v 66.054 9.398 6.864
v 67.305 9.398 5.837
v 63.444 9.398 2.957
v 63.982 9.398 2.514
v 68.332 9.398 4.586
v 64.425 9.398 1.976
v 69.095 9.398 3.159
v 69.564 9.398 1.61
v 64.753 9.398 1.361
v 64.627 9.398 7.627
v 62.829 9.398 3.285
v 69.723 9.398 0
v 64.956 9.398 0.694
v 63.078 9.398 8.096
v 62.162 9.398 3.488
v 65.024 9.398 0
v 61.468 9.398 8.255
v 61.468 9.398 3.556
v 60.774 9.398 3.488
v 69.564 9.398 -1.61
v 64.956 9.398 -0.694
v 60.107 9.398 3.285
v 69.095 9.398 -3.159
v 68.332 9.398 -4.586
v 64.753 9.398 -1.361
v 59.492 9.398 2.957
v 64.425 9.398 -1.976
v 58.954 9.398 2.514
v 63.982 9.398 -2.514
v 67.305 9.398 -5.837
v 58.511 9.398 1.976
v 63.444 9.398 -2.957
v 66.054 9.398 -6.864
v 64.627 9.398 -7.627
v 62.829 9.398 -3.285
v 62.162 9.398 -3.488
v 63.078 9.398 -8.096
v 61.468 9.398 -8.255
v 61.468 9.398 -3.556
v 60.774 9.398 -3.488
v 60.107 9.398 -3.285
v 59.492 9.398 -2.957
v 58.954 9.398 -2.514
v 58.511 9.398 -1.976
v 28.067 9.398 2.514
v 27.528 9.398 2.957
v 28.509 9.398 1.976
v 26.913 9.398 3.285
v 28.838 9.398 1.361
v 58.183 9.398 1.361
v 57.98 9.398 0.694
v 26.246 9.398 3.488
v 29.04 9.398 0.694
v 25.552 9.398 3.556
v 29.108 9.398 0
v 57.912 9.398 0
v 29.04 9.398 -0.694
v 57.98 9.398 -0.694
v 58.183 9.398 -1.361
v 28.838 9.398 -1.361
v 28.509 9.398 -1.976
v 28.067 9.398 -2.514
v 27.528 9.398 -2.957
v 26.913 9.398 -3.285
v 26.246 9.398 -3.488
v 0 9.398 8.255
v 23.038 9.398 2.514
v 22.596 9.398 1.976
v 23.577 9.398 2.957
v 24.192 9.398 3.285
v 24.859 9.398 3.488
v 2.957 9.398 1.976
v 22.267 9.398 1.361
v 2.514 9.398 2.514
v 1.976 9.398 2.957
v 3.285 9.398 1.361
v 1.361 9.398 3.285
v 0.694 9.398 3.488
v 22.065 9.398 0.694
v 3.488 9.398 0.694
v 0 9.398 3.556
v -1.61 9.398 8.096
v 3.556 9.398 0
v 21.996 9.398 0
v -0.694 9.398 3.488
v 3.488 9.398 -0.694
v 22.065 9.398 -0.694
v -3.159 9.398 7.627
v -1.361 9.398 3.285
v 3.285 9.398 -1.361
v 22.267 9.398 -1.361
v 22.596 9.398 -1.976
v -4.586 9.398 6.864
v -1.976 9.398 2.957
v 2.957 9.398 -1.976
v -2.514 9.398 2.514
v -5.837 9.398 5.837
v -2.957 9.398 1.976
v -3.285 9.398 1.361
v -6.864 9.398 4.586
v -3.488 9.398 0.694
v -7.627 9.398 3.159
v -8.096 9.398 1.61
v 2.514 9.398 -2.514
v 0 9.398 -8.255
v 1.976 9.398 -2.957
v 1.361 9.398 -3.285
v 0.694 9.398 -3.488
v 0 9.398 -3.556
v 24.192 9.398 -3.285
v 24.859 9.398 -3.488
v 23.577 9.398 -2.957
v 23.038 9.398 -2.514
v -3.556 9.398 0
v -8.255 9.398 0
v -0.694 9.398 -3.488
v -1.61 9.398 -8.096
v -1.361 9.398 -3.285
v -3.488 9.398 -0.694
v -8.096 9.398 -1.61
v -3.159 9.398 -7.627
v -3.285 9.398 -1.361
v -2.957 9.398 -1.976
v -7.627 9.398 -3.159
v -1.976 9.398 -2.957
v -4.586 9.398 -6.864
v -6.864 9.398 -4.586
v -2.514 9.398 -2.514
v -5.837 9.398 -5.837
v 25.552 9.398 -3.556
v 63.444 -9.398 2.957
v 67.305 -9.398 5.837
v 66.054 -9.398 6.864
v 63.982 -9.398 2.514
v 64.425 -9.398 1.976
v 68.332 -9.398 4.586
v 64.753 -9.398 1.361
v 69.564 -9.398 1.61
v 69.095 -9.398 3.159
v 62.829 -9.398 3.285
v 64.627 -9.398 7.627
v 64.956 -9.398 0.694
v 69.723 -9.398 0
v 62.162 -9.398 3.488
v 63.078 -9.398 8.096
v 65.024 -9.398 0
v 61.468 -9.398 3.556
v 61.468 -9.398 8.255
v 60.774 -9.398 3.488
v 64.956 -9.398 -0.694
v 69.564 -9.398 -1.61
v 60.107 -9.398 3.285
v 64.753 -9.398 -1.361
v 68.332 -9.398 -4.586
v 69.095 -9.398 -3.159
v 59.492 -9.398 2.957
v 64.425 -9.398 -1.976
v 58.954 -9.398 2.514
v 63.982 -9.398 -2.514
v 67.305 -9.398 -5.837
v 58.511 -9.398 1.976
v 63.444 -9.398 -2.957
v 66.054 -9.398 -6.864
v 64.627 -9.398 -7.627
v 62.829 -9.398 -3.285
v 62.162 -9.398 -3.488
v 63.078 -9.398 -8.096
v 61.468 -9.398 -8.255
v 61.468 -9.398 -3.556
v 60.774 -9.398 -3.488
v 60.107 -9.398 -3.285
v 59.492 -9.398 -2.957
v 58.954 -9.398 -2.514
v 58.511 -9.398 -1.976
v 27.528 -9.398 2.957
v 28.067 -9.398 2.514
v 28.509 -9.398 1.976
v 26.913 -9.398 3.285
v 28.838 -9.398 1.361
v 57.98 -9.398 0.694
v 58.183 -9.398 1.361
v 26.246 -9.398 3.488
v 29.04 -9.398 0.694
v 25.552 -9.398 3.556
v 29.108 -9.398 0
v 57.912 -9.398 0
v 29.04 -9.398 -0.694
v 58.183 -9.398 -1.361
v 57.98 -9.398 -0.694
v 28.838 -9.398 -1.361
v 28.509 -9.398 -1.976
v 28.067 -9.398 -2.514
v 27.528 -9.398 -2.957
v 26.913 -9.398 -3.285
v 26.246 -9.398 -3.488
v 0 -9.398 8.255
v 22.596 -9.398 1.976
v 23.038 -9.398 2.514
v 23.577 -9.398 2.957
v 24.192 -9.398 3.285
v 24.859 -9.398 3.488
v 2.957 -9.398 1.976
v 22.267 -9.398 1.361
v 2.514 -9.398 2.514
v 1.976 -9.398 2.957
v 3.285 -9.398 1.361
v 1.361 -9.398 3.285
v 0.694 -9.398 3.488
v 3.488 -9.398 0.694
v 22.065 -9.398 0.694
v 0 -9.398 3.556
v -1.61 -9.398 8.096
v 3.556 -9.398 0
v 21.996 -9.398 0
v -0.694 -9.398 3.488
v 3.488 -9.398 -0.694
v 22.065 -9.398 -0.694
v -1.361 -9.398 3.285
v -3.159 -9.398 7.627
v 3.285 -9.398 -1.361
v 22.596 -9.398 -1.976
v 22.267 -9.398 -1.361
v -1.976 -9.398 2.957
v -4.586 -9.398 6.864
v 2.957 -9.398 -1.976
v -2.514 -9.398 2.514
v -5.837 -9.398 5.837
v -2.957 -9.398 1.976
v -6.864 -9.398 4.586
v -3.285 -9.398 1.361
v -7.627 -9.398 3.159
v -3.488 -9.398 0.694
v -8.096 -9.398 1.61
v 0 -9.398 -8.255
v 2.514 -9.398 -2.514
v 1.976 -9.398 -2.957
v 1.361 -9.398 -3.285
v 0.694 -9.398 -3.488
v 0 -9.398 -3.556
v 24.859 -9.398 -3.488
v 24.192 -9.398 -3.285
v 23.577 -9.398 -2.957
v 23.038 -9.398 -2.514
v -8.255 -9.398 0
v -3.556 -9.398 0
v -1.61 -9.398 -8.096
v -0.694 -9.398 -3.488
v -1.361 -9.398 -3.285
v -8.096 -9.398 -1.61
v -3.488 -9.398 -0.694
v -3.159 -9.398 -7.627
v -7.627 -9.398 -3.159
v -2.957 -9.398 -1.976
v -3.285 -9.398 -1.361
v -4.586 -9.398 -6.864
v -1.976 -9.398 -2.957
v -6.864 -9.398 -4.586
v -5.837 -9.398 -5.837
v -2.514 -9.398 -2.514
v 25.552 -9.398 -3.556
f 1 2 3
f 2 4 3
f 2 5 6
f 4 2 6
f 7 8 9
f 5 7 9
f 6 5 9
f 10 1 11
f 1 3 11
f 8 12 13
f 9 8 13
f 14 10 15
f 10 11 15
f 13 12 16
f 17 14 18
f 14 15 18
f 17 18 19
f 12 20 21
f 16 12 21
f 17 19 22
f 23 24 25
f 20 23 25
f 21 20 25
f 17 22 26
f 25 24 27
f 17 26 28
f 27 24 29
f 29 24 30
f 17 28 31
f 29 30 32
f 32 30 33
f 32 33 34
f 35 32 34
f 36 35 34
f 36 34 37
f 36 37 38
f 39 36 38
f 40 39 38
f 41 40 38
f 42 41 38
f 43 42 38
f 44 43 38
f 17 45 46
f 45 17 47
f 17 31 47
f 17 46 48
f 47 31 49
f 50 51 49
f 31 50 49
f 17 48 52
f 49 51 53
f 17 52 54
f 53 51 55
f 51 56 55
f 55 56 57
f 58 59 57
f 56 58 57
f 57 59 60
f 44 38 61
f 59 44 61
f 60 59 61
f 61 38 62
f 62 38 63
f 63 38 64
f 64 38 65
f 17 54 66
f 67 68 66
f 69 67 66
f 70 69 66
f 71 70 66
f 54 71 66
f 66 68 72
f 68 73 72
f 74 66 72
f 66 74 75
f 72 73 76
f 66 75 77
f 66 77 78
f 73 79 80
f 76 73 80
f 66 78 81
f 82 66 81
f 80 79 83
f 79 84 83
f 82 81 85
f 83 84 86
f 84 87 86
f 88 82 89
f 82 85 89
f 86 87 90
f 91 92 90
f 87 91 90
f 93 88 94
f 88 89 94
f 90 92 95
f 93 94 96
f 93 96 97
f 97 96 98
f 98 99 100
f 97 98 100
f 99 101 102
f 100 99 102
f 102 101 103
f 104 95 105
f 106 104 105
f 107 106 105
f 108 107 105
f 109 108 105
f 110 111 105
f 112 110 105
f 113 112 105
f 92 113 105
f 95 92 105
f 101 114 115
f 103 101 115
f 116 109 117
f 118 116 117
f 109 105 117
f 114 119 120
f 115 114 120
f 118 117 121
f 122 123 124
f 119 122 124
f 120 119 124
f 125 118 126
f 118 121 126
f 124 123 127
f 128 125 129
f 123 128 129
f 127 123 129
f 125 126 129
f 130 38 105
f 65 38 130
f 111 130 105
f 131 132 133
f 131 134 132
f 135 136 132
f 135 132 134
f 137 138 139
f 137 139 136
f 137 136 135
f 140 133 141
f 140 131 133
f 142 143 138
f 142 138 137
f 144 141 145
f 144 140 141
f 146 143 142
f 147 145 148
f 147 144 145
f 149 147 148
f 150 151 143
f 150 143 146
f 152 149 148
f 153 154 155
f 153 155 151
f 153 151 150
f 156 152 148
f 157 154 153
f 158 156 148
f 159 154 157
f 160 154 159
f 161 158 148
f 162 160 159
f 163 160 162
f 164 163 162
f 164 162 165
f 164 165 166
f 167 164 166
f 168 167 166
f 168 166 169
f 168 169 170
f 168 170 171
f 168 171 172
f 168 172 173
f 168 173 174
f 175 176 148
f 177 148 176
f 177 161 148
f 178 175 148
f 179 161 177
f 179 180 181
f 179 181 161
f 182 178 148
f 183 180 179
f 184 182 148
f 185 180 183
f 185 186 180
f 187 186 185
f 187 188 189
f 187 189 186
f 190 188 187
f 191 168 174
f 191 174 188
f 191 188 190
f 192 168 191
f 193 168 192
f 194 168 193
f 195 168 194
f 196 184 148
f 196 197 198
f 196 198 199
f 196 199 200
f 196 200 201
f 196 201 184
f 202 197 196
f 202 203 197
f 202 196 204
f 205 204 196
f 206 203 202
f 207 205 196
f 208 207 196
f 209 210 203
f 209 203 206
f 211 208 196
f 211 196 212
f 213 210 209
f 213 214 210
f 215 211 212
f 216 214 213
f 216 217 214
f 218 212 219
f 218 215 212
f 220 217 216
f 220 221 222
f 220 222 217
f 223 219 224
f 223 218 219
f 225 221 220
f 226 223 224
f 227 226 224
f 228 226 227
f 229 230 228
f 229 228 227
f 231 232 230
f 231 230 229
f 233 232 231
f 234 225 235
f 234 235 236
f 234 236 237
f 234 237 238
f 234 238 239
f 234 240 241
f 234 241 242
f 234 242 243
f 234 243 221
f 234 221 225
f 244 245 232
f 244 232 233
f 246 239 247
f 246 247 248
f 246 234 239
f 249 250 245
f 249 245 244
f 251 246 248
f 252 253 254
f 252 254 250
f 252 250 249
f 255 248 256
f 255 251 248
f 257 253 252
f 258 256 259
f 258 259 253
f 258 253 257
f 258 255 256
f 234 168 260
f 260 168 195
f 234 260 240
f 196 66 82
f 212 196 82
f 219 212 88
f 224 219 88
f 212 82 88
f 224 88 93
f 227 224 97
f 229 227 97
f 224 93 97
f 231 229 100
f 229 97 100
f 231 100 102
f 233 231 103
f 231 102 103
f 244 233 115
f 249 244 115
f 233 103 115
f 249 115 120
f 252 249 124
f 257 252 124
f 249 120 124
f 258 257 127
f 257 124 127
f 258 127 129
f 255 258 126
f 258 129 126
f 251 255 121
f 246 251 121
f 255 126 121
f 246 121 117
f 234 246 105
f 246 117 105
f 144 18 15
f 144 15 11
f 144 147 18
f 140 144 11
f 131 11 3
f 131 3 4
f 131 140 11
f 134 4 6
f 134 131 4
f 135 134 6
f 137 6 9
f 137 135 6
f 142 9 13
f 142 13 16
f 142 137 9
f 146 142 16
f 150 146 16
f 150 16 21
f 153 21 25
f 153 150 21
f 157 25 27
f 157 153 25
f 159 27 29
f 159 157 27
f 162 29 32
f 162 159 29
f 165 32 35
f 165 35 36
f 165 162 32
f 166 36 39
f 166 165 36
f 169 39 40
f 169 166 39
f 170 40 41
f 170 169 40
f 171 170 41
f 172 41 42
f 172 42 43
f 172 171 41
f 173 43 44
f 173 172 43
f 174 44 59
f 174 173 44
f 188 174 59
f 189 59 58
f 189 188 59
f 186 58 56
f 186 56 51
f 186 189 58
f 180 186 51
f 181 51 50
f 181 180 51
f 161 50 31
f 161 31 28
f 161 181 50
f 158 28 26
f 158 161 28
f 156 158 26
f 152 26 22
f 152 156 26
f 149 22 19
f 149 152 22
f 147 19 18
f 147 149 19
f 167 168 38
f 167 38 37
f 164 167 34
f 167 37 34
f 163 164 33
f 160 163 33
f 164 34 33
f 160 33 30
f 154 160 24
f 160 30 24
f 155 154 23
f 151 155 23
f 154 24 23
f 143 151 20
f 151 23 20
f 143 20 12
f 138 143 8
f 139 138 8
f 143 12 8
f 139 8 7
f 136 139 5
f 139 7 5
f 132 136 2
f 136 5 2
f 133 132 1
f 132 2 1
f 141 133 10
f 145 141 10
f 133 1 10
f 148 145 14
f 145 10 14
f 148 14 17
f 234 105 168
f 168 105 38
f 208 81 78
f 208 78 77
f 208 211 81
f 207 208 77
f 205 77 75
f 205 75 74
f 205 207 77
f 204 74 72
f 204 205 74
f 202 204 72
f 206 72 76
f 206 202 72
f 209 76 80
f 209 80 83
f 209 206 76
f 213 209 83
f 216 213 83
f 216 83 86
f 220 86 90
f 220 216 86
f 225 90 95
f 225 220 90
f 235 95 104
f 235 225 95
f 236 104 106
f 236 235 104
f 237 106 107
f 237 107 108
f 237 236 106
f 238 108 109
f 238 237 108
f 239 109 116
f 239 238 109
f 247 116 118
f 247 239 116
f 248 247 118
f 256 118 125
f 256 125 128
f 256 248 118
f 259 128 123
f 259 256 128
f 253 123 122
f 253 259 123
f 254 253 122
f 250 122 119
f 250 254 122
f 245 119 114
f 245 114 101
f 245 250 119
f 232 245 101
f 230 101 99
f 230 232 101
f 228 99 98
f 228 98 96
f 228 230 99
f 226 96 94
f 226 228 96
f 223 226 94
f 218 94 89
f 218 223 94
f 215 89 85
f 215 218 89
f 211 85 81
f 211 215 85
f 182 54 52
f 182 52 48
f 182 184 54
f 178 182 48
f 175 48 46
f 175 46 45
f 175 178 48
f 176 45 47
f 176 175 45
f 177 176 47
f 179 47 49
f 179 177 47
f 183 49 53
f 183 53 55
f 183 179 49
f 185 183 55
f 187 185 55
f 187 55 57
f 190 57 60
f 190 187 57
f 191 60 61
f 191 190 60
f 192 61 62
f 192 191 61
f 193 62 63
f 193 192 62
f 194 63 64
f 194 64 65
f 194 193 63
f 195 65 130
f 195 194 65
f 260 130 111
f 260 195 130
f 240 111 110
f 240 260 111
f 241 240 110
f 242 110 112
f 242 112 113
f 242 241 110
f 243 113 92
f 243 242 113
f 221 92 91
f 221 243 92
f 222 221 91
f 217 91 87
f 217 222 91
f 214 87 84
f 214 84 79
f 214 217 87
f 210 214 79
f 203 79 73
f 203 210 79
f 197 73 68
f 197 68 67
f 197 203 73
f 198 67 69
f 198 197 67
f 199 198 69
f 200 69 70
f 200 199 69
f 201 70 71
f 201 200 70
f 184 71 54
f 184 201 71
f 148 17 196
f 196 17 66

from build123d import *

# Parameters (mm, degrees)
SKETCH1_R           = 3.556
BOSS_EXTRUDE1_DEPTH = 9.398


with BuildPart() as part:
    # Sketch1 → Boss-Extrude1 (new, symmetric)
    with BuildSketch(Plane(origin=(0, 0, 0), x_dir=(1, 0, 0), z_dir=(0, 1, 0))):
        with BuildLine():
            Line((0, 8.255), (61.468, 8.255))
            ThreePointArc((61.468, 8.255), (69.723, 0), (61.468, -8.255))
            Line((61.468, -8.255), (0, -8.255))
            ThreePointArc((0, -8.255), (-8.255, 0), (0, 8.255))
        make_face()
        with Locations(Location((0, 0, 0), (0, 0, 270))):
            Circle(SKETCH1_R, mode=Mode.SUBTRACT)
        with Locations(Location((25.5524, 0, 0), (0, 0, 270))):
            Circle(SKETCH1_R, mode=Mode.SUBTRACT)
        with Locations(Location((61.468, 0, 0), (0, 0, 270))):
            Circle(SKETCH1_R, mode=Mode.SUBTRACT)
    extrude(amount=BOSS_EXTRUDE1_DEPTH, both=True)


solid = part.part
